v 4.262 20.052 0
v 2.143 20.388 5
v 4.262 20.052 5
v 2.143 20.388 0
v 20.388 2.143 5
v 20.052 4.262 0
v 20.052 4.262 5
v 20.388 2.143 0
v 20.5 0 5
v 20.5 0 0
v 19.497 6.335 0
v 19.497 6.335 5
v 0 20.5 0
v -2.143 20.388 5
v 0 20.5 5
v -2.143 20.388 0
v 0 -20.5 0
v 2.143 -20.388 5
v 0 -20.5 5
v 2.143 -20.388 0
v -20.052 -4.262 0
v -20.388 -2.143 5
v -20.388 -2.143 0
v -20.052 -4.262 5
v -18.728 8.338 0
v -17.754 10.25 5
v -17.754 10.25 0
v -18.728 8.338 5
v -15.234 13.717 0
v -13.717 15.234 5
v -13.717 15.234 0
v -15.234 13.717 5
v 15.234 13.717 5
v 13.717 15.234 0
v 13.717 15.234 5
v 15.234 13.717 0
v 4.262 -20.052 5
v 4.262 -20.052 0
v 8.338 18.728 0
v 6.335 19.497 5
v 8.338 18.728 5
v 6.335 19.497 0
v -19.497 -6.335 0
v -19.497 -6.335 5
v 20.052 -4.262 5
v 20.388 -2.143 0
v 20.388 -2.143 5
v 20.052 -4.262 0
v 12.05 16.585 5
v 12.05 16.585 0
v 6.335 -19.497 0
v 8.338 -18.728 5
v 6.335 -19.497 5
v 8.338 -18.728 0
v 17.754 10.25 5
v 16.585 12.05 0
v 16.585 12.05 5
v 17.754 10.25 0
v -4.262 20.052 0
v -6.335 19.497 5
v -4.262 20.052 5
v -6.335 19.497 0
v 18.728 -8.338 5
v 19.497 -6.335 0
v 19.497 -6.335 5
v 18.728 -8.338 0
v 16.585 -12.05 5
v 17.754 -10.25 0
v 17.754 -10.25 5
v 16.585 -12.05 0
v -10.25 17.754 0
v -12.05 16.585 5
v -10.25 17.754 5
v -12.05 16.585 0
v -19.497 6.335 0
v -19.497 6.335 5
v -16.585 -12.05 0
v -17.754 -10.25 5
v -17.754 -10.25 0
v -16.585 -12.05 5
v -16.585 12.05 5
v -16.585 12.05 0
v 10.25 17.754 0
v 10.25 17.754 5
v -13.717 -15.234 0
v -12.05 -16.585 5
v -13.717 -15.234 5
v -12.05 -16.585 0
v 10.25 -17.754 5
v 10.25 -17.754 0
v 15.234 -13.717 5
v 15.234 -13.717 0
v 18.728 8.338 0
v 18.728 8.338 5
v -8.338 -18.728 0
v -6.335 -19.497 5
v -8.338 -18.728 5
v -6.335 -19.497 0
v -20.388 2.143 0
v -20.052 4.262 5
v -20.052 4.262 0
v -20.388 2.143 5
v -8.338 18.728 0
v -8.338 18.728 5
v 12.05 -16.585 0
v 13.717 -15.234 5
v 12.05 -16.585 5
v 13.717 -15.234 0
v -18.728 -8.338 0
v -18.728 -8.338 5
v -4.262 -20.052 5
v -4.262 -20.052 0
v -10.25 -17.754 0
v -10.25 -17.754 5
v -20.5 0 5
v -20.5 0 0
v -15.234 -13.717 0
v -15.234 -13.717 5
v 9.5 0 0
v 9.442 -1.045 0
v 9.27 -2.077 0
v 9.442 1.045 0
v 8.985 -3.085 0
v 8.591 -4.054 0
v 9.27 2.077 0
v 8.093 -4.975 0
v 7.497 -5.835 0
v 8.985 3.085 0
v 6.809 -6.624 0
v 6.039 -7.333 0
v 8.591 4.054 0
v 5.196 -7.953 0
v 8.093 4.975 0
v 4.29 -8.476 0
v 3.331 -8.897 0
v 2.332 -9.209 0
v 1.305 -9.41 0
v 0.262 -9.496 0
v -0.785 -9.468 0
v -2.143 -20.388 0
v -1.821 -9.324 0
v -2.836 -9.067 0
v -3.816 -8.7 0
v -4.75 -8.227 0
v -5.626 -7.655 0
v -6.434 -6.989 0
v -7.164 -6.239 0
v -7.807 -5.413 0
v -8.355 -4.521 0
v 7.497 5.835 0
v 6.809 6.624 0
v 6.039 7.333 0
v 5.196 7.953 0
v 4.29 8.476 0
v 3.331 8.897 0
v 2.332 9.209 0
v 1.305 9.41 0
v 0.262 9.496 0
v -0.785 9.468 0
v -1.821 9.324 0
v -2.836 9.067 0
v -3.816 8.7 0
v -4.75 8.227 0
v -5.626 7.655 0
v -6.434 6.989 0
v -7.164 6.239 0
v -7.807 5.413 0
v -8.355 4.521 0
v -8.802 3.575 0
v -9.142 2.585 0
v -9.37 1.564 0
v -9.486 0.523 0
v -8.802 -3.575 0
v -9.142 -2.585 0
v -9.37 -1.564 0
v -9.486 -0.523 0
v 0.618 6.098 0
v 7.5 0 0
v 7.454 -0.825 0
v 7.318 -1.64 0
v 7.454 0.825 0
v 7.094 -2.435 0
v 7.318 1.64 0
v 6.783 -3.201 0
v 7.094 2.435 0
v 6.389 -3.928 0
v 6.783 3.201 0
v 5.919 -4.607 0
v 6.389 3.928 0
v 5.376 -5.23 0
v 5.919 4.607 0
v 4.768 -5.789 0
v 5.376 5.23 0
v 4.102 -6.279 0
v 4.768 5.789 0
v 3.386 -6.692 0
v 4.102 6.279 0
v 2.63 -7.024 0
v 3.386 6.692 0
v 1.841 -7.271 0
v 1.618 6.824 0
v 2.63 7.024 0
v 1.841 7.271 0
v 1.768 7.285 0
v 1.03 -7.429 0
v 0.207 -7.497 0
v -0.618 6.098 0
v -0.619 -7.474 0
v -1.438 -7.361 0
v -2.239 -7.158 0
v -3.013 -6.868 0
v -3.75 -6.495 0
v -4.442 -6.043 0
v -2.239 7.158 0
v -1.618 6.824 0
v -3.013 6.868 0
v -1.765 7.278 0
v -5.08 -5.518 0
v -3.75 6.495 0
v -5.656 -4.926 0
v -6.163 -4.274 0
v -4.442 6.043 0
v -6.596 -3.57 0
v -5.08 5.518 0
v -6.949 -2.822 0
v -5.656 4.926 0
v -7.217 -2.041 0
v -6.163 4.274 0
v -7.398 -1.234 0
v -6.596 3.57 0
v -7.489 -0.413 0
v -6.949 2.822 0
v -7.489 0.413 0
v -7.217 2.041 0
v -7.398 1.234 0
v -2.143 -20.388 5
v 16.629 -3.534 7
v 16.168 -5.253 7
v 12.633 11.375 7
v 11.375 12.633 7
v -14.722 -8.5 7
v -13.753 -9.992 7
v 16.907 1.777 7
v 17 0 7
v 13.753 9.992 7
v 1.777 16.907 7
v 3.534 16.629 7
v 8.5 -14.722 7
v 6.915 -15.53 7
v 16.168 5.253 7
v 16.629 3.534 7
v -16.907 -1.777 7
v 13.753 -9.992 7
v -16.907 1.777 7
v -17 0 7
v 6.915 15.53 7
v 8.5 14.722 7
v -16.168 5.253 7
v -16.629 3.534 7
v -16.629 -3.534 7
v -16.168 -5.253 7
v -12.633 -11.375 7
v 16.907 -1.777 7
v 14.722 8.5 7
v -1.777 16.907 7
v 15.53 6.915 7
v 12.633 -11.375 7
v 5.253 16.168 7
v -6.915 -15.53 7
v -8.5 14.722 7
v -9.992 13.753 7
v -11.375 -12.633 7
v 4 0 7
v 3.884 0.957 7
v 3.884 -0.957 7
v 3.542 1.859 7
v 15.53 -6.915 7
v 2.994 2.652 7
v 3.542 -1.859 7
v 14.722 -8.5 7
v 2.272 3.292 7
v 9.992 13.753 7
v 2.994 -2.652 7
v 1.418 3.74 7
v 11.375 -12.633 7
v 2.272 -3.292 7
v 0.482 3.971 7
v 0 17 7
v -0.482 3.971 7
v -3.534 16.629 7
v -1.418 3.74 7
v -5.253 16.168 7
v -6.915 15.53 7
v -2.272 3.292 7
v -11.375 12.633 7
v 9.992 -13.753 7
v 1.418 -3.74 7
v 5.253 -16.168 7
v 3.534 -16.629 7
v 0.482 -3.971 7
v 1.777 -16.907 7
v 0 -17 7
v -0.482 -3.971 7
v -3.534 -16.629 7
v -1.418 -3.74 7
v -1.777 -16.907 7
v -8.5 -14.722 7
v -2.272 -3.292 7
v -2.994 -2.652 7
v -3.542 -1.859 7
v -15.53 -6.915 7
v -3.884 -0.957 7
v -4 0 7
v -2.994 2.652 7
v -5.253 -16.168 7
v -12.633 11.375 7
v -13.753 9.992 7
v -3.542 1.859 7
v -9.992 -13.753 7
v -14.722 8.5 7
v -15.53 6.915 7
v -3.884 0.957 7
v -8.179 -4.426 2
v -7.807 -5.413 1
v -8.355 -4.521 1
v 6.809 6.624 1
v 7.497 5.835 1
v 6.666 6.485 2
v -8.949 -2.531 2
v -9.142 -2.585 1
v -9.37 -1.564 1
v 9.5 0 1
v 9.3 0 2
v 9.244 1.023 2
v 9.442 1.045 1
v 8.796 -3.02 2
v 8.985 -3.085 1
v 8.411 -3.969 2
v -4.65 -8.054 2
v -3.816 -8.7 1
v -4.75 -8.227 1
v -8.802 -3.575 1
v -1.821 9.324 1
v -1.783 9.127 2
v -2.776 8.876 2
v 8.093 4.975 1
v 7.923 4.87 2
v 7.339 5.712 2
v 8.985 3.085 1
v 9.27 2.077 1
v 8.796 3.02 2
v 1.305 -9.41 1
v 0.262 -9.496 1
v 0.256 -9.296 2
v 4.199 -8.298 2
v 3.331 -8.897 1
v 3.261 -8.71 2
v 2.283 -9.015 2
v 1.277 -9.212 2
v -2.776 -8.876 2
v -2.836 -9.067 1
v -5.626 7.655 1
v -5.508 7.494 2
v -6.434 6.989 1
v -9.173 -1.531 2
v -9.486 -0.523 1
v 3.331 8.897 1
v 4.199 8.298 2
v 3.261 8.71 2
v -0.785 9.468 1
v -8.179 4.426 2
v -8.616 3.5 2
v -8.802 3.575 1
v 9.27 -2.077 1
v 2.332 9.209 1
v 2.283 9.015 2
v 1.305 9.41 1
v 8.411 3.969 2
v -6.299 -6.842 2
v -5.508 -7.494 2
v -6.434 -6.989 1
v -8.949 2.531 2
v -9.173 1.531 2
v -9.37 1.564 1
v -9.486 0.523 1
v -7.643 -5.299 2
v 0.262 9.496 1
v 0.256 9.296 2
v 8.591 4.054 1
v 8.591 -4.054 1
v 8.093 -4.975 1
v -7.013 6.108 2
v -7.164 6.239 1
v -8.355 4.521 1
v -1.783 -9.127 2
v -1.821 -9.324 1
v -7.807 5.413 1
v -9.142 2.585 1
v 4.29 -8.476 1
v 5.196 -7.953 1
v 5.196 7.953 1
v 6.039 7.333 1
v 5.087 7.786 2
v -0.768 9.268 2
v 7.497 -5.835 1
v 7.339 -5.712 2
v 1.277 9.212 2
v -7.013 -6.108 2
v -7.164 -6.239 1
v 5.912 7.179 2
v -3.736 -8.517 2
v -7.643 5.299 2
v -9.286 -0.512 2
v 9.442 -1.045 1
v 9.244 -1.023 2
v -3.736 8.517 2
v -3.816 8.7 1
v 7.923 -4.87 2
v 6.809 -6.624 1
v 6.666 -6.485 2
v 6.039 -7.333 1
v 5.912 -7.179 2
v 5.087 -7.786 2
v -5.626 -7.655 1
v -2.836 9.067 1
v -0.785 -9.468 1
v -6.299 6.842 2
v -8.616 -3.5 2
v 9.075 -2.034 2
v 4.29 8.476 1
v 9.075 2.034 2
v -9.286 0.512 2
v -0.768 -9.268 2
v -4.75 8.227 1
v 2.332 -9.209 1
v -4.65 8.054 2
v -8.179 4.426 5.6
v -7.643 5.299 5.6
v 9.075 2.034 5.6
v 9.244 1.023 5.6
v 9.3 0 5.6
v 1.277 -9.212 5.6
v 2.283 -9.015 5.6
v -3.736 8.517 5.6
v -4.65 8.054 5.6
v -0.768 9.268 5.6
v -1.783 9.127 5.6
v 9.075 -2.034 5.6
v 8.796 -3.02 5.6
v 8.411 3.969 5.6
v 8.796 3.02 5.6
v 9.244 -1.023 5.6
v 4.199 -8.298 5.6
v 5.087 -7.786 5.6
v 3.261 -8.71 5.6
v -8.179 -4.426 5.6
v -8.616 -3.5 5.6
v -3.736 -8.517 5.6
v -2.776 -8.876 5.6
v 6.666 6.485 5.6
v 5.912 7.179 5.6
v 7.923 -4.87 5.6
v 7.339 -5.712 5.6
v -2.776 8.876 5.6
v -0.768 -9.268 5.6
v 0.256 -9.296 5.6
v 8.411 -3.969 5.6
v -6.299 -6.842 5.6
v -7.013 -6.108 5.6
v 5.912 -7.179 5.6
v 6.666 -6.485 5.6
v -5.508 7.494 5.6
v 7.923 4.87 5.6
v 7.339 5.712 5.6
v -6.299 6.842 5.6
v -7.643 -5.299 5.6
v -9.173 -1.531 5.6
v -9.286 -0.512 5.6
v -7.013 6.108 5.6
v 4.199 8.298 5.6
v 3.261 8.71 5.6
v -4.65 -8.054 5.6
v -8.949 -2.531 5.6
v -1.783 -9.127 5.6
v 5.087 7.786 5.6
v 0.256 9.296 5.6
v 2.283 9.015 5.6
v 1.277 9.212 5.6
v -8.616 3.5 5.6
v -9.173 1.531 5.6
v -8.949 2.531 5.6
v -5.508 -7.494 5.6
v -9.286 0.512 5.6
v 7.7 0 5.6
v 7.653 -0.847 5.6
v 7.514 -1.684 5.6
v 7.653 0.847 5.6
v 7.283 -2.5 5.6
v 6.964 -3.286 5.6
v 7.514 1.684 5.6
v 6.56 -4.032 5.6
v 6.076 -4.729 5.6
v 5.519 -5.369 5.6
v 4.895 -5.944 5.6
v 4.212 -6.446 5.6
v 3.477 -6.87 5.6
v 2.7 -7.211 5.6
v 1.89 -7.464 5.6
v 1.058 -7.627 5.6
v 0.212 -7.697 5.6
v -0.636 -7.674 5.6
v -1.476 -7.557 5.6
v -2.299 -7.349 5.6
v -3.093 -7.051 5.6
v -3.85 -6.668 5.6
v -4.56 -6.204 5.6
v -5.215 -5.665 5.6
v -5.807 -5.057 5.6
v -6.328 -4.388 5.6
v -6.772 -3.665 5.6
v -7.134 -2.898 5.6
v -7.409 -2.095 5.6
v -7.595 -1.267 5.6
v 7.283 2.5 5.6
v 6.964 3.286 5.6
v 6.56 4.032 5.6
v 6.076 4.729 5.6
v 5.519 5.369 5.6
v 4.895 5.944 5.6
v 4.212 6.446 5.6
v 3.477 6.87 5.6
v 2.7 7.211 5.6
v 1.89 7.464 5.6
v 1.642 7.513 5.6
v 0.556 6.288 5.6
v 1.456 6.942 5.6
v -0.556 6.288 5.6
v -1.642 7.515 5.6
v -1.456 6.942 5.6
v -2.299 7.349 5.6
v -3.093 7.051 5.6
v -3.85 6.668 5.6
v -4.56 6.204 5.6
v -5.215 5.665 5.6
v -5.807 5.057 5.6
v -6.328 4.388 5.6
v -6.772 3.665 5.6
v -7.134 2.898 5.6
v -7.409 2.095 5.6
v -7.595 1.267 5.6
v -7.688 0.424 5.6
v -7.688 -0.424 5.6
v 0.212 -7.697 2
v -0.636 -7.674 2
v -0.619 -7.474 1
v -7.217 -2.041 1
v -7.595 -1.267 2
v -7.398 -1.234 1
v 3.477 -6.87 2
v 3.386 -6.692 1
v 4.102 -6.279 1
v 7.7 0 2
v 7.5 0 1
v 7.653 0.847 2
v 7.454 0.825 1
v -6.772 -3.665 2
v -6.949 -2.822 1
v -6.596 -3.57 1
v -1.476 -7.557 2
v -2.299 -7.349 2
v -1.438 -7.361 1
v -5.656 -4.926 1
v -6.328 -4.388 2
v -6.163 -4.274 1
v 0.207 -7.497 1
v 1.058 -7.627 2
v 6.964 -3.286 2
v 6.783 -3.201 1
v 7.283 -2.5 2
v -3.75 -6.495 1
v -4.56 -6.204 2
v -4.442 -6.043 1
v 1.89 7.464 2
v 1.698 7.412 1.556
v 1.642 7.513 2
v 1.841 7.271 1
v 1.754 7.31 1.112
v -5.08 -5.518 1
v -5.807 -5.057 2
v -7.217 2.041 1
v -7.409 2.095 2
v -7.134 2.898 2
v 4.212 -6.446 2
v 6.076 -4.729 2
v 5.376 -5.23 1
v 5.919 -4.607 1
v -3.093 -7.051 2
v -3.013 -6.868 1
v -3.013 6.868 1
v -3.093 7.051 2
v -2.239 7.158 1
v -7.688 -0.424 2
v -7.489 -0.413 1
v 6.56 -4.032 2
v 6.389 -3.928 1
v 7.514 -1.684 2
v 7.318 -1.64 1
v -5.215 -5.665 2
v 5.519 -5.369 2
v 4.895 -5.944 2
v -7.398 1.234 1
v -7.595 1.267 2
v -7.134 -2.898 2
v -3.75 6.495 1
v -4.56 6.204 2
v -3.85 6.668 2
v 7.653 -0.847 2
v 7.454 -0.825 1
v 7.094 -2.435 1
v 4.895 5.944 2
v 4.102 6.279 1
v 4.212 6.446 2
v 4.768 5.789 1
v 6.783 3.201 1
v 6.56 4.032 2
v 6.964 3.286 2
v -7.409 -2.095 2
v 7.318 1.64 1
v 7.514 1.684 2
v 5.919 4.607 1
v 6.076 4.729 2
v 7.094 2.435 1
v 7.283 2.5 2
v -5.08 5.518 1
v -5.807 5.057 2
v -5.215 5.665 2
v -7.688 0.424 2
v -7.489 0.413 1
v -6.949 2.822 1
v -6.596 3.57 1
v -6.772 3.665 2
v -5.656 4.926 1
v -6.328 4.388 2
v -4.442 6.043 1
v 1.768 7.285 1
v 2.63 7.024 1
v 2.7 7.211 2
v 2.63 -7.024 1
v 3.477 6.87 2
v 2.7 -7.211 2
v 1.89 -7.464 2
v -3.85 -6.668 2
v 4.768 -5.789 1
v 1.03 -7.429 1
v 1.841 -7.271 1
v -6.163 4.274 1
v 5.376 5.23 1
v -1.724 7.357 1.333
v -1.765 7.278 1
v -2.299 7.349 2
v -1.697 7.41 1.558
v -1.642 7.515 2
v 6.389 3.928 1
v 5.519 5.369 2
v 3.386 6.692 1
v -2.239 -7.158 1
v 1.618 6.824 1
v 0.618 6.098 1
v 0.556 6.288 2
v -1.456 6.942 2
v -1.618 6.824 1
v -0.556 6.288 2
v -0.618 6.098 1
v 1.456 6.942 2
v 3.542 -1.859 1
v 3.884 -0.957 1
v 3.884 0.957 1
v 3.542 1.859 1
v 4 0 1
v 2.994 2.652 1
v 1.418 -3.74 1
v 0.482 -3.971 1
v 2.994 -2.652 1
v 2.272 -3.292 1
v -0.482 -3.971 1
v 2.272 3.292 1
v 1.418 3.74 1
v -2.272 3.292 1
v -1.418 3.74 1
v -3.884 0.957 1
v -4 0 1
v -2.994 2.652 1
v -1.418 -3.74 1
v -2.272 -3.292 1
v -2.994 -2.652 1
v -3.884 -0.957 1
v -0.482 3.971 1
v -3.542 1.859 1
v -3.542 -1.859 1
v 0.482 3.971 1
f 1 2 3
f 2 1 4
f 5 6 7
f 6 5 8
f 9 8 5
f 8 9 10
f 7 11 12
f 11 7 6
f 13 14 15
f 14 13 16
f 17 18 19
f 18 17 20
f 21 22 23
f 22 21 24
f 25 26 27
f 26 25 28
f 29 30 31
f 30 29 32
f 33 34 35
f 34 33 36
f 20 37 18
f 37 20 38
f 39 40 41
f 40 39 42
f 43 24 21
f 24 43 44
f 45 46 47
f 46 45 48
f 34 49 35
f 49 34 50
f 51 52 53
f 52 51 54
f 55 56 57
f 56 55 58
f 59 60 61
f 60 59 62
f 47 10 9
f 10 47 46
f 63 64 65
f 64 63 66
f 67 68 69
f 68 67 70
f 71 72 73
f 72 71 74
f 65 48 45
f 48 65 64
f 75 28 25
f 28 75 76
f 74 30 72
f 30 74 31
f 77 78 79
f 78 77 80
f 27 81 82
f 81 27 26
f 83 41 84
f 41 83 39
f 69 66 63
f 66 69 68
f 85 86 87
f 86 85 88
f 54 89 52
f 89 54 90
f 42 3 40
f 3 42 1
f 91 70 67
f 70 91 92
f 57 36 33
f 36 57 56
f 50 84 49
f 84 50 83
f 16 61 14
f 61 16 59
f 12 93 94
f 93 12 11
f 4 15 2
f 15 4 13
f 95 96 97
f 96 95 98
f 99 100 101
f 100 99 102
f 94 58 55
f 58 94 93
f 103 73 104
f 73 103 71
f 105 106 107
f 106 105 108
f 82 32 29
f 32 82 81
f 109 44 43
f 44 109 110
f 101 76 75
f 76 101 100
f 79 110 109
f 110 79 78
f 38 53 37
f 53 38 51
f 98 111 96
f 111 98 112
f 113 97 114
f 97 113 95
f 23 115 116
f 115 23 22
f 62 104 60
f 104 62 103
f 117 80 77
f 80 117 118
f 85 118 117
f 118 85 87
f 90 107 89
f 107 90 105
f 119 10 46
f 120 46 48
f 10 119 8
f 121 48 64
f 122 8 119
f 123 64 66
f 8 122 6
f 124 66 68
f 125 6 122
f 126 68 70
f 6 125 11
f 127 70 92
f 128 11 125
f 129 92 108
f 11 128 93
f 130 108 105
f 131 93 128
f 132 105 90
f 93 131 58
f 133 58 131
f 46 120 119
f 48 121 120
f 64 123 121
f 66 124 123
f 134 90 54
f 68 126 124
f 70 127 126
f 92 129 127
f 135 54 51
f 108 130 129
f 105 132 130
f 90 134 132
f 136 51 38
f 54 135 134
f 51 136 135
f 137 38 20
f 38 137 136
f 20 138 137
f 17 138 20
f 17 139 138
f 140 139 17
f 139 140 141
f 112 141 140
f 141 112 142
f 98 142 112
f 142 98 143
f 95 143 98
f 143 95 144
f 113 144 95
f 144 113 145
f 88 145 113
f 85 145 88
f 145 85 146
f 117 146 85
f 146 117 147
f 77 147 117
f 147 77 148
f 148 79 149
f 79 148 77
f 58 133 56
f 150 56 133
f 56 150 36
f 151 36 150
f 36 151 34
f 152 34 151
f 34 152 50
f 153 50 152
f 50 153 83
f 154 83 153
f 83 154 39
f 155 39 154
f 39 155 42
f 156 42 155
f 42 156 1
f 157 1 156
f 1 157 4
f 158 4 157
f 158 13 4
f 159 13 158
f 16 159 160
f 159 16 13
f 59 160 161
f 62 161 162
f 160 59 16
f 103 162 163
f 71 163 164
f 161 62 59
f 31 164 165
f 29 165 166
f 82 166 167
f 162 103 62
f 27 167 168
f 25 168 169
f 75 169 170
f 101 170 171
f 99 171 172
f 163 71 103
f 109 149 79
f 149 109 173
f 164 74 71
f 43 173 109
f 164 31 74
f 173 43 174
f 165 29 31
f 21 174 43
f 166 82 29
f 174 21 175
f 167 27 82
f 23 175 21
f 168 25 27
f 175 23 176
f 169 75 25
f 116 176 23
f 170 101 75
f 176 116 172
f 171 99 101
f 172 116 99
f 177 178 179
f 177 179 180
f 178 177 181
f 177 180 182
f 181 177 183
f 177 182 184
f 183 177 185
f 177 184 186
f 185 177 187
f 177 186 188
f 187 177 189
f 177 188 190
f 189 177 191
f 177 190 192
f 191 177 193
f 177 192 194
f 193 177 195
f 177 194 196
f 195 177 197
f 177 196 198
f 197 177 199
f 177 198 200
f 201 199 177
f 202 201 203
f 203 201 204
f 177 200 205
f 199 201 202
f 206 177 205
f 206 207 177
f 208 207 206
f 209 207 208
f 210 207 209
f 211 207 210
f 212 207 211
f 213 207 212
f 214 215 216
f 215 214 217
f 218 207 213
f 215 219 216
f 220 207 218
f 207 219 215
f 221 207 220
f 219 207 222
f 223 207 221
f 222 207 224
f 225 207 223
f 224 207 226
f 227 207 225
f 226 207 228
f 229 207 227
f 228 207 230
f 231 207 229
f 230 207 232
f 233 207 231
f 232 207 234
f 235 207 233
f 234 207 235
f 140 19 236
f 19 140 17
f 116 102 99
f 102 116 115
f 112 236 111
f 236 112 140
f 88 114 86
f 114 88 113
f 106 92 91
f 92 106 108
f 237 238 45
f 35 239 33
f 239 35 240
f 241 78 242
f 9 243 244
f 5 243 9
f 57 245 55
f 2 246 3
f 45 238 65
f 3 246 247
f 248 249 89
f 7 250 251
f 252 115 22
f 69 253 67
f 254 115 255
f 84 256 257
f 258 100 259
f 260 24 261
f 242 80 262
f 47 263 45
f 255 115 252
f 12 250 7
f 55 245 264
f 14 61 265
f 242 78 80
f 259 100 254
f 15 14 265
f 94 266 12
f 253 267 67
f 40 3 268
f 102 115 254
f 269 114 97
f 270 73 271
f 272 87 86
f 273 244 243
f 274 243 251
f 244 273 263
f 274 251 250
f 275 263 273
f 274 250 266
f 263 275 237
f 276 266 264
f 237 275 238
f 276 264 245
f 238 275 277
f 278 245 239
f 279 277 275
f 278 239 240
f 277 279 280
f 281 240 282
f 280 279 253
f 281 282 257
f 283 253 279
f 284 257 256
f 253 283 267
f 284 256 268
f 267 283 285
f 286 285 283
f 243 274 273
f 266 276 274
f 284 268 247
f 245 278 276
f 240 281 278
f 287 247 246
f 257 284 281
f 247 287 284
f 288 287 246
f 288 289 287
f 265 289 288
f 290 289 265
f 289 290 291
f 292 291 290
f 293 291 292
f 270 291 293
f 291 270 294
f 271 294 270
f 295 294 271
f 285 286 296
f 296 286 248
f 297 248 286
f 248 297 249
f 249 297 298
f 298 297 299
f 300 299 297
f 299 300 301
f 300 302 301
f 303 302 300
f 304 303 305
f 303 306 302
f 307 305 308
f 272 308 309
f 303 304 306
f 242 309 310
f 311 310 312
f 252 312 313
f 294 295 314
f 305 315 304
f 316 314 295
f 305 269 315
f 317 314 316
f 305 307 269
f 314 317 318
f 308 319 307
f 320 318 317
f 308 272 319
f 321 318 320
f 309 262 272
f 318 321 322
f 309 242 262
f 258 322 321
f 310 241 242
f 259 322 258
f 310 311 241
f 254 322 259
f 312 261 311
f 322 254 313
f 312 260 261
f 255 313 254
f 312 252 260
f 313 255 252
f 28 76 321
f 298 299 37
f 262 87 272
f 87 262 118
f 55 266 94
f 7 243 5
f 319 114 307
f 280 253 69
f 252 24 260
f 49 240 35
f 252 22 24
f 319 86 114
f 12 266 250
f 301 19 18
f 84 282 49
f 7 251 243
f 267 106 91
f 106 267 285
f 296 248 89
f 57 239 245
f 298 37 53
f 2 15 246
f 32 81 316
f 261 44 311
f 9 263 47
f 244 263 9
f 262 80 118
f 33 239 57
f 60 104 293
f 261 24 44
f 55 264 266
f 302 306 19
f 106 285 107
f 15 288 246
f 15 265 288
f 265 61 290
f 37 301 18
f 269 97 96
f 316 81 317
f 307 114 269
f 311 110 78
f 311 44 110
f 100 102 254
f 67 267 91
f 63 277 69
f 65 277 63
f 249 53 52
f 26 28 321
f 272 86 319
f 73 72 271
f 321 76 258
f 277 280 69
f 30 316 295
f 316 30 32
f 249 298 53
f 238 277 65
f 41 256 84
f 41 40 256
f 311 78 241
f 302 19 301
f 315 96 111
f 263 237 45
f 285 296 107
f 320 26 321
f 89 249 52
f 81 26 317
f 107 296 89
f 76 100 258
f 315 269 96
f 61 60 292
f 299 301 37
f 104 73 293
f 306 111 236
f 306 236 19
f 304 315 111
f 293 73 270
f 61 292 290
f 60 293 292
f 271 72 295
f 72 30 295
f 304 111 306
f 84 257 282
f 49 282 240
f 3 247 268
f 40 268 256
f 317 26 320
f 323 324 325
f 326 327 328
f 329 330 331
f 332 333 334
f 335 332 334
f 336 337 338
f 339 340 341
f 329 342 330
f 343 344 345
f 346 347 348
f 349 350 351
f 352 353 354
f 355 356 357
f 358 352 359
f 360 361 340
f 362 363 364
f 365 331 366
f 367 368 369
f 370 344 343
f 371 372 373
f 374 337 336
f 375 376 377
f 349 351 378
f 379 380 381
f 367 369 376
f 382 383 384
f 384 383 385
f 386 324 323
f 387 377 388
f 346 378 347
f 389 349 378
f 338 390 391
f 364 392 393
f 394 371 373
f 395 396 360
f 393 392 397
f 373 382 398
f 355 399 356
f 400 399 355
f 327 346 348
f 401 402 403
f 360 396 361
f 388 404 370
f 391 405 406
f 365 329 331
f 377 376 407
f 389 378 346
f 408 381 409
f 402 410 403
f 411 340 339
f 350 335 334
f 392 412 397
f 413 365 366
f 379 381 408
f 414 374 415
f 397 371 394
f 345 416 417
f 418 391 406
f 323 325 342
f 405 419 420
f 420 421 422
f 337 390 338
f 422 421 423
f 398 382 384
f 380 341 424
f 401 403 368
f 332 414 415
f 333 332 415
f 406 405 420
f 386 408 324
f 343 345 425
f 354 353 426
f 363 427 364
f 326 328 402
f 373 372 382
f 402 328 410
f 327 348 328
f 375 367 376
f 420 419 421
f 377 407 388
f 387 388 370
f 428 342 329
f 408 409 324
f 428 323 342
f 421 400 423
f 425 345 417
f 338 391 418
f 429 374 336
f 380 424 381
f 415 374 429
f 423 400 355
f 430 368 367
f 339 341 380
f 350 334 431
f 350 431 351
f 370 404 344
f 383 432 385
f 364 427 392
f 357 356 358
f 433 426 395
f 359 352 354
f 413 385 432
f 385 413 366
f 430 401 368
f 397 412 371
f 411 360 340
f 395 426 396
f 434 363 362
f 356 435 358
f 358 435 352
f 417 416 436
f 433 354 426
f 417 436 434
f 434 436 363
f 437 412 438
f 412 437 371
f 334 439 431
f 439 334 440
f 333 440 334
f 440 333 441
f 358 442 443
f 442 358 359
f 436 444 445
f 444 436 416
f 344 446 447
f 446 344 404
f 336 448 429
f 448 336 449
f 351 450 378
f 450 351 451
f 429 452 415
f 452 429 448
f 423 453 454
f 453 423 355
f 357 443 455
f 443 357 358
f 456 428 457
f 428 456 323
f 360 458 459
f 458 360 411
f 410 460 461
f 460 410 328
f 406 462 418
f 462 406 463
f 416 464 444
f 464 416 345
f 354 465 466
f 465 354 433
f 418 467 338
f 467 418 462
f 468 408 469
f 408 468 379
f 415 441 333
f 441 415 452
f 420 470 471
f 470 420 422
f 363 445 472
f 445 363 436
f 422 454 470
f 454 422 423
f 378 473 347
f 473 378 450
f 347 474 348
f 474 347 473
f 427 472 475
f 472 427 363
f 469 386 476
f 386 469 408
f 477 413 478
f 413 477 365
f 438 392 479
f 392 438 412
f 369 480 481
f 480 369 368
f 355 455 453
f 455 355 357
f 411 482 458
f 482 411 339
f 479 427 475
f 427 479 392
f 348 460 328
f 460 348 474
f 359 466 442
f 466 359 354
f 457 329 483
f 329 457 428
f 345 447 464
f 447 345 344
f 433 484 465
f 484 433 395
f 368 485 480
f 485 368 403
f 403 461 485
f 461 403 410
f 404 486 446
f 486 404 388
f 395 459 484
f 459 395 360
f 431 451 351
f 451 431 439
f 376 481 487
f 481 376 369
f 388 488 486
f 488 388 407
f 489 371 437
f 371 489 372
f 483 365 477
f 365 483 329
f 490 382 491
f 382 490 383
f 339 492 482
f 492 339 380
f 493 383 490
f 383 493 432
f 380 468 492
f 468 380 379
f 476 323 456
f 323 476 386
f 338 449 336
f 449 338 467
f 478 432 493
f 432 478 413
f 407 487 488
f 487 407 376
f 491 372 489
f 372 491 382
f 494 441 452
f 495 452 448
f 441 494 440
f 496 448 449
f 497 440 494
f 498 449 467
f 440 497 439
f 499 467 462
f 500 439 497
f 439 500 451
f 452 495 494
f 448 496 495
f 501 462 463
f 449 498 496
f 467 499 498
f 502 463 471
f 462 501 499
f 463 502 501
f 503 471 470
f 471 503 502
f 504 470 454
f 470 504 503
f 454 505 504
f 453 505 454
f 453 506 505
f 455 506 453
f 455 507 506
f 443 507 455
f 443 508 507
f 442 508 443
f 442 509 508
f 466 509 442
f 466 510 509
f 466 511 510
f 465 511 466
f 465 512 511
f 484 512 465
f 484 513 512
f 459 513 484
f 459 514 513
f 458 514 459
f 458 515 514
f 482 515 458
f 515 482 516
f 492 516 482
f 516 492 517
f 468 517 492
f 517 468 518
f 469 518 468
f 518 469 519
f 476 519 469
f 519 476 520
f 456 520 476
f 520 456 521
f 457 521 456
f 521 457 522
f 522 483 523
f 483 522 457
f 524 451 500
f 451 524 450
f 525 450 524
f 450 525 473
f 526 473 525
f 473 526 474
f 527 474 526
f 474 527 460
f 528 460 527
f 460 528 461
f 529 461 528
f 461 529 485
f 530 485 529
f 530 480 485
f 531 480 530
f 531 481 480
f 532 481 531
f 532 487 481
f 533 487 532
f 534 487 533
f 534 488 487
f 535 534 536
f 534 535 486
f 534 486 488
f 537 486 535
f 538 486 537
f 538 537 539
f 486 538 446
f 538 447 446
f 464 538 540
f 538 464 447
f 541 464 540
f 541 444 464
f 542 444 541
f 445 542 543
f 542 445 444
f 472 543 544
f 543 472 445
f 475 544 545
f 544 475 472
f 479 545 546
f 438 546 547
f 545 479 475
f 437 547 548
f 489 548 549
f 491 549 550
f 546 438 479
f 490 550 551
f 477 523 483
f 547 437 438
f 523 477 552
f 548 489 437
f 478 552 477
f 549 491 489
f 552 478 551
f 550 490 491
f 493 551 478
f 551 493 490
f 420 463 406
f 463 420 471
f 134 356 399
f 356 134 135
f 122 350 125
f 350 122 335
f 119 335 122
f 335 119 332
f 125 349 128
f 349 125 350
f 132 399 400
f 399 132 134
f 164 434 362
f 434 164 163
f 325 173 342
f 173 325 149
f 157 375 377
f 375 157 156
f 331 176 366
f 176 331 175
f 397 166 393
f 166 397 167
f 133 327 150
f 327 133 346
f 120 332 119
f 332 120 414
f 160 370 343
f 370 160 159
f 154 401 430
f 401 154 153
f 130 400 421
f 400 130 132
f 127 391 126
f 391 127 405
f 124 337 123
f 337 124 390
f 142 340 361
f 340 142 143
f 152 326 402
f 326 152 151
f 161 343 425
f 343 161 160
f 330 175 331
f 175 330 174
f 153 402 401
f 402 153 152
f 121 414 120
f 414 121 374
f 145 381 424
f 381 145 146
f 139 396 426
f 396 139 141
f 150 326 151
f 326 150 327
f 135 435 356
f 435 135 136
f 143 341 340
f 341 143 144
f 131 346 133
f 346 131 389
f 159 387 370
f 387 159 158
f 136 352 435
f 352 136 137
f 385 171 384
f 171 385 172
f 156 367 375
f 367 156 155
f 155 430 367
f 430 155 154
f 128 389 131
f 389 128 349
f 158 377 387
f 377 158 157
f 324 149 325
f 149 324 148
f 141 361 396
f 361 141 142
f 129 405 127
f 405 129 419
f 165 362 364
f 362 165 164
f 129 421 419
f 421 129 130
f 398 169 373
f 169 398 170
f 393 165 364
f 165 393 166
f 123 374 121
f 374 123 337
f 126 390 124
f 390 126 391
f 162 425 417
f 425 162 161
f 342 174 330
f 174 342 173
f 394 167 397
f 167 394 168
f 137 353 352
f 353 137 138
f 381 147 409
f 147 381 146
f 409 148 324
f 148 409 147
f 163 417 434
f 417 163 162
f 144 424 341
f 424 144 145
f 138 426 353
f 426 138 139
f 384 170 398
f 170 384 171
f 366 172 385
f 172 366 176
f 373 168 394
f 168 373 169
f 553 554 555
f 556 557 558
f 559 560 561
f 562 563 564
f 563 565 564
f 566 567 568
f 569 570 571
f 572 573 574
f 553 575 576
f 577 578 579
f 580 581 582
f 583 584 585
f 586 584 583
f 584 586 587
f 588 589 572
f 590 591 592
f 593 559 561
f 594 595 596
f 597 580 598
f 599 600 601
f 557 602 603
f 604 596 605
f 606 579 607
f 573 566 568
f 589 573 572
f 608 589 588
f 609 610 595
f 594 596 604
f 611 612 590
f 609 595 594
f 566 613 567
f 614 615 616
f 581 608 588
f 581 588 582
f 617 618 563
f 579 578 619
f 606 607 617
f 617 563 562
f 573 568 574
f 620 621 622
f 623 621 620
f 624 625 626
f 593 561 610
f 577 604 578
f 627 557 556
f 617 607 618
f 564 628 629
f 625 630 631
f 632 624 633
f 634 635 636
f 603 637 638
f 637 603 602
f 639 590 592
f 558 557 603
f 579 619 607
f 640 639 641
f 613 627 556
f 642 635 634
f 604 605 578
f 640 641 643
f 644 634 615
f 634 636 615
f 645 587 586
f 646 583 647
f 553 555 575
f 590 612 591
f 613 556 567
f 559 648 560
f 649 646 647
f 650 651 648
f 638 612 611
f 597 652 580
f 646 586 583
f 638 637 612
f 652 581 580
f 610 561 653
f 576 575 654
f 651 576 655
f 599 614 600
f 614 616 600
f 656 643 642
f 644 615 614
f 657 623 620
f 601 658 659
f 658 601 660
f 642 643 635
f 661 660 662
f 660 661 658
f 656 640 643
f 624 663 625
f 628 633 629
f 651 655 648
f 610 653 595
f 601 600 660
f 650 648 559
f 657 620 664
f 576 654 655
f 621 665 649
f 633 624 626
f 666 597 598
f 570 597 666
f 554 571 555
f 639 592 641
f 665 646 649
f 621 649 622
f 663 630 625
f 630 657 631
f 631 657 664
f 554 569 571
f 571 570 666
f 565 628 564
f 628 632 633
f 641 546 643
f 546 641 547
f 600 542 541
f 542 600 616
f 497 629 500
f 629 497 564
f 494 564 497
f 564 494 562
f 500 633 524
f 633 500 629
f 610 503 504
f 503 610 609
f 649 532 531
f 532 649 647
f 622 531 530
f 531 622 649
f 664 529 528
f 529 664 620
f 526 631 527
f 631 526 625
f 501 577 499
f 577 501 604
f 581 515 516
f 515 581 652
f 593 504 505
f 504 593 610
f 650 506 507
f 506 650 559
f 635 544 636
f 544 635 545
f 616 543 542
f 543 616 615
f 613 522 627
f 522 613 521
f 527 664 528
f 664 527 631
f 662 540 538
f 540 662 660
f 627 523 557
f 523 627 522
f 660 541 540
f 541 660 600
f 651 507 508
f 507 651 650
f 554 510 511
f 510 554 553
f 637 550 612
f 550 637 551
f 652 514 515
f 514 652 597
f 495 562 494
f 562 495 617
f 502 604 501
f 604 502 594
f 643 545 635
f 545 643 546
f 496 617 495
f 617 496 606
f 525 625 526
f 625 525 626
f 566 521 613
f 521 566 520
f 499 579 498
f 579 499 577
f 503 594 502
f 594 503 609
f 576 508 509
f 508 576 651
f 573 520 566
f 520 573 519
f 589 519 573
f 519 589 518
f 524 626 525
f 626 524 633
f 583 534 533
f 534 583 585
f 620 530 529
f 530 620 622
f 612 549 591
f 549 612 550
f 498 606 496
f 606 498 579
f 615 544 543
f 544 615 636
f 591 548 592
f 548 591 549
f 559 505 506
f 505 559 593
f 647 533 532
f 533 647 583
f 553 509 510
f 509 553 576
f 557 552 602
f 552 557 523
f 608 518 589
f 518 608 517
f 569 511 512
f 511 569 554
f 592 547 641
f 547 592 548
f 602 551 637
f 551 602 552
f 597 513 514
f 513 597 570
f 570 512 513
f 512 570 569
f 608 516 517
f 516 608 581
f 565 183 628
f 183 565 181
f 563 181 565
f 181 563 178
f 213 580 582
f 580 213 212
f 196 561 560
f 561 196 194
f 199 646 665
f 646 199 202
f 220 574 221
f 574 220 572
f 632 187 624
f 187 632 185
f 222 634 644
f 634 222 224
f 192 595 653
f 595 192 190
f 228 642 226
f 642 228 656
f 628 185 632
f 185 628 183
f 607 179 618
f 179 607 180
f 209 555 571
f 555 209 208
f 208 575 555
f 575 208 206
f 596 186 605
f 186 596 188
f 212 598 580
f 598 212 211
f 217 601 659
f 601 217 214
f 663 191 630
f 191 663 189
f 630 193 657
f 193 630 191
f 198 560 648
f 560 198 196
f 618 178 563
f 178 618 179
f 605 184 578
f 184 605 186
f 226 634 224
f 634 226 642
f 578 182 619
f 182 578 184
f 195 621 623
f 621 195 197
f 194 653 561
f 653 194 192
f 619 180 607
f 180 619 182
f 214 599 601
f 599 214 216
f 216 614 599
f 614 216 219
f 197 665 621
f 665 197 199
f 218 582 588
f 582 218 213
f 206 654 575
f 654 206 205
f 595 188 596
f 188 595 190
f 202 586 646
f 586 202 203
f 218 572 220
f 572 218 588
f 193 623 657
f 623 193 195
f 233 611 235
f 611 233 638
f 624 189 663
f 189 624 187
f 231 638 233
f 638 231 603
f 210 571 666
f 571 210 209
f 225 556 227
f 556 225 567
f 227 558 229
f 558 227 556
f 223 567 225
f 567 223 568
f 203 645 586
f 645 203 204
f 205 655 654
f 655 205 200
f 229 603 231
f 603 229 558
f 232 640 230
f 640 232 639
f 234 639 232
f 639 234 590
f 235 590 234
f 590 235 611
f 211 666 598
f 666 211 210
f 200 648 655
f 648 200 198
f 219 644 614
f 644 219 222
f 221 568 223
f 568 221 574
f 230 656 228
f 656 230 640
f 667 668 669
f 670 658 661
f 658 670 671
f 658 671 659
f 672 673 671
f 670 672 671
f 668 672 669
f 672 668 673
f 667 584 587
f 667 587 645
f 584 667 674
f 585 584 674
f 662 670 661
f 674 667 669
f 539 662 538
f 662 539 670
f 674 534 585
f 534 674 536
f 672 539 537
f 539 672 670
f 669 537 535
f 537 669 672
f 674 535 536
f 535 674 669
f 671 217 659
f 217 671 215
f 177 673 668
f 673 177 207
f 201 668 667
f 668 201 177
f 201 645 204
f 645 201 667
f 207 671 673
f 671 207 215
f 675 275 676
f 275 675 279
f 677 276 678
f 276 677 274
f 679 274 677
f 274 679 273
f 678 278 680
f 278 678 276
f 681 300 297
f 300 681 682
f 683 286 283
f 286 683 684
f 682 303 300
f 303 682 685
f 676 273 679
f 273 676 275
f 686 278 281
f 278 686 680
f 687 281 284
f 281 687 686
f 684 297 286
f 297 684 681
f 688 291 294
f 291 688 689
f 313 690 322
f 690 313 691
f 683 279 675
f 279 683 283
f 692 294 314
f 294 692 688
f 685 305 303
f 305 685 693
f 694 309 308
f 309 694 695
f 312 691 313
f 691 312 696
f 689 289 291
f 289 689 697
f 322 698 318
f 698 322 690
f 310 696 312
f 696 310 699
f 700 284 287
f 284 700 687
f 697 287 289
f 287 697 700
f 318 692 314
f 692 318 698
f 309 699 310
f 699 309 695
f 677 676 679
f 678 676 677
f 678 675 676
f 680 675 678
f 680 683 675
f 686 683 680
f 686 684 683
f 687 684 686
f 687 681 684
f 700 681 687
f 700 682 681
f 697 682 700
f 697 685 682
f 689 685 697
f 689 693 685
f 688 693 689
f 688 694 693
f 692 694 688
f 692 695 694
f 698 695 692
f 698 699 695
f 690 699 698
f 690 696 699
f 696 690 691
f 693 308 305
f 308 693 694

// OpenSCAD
// file: ../../connectors/notched_circle/constants.scad
connectors_notched_circle_thickness = 2;
connectors_notched_circle_notch_diameter = 3;
connectors_notched_circle_loose_length = 1;
connectors_notched_circle_loose_to_tight_length = 1;
// file: ../../connectors/notched_circle/female.scad
include <../../settings.scad>;
use <../../utilities/cylinders.scad>;
include <constants.scad>;

// Renders the female counterpart of a circular connector with an orienting
// notch.  Place on the surface oriented so that Z- is the surface normal.
module connectors_notched_circle_female(
    // The outer diameter of the compatible male circle.
    diameter,
    // The length of the male compatible circle.
    length
) {
  outer_circle_diameter_loose = diameter + loose_tolerance;
  outer_circle_diameter_tight = diameter + tight_tolerance;
  inner_circle_diameter_loose = diameter - connectors_notched_circle_thickness - loose_tolerance;
  inner_circle_diameter_tight = diameter - connectors_notched_circle_thickness - tight_tolerance;
  notch_diameter_loose = connectors_notched_circle_notch_diameter + loose_tolerance;
  notch_diameter_tight = connectors_notched_circle_notch_diameter + tight_tolerance;
  final_circle_length = length + tight_tolerance - connectors_notched_circle_loose_length - connectors_notched_circle_loose_to_tight_length;
  union() {
    difference() {
      // The outer circle.
      cylinder_sequence(
        outer_circle_diameter_loose,
        [
          [
            connectors_notched_circle_loose_length,
            outer_circle_diameter_loose
          ],
          [
            connectors_notched_circle_loose_to_tight_length,
            outer_circle_diameter_tight
          ],
          [
            final_circle_length,
            outer_circle_diameter_tight
          ],
        ],
        cylinder_sides(diameter)
      );

      // The inner circle.
      cylinder_sequence(
        inner_circle_diameter_loose,
        [
          [
            connectors_notched_circle_loose_length,
            inner_circle_diameter_loose
          ],
          [
            connectors_notched_circle_loose_to_tight_length,
            inner_circle_diameter_tight
          ],
          [
            final_circle_length,
            inner_circle_diameter_tight
          ],
        ],
        cylinder_sides(diameter)
      );
    };

    intersection() {
      // The notch.
      translate([
        0,
        diameter / 2 - connectors_notched_circle_thickness / 2,
        0
      ]) {
        cylinder_sequence(
          notch_diameter_loose,
          [
            [
              connectors_notched_circle_loose_length,
              notch_diameter_loose
            ],
            [
              connectors_notched_circle_loose_to_tight_length,
              notch_diameter_tight
            ],
            [
              final_circle_length,
              notch_diameter_tight
            ],
          ],
          cylinder_sides(connectors_notched_circle_notch_diameter)
        );
      };

      // Ensure that the notch does not escape the outer circle.
      cylinder_sequence(
        outer_circle_diameter_loose,
        [
          [
            connectors_notched_circle_loose_length,
            outer_circle_diameter_loose
          ],
          [
            connectors_notched_circle_loose_to_tight_length,
            outer_circle_diameter_tight
          ],
          [
            final_circle_length,
            outer_circle_diameter_tight
          ],
        ],
        cylinder_sides(diameter)
      );
    };
  };
};
// file: measurements.scad
hero_dualie_muzzle_hole_diameter = 8;
hero_dualie_muzzle_hole_depth = 6;
hero_dualie_muzzle_end_diameter = 34;
hero_dualie_muzzle_start_diameter = 41;
hero_dualie_muzzle_length = 2;
hero_dualie_muzzle_connector_diameter = 18;
hero_dualie_muzzle_connector_length = 5;
// file: ../../utilities/cylinders.scad
// Calculates the $fn which should be used for a cylinder of a specific size.
function cylinder_sides(
  // The diameter of the cylinder.
  diameter
) = ceil(
  max(
    min(
      360 / $fa,
      diameter * PI / $fs
    ),
    8
  )
);

// Generates a grid of square perforations through a cylinder of a specific
// size.
module cylinder_perforations(
  // The diameter of the cylinder.
  diameter,
  // The height of the cylinder.
  length,
  // The size (width/height) of each perforation.
  perforation_size,
  // The target spacing between perforations.  This will be adjusted to fit
  // evenly on the cylinder.
  perforation_spacing
) {
  half_perimeter = diameter * PI / 2;
  angularPerforations = round(half_perimeter / perforation_spacing);
  zPerforations = round(half_perimeter / perforation_spacing);
  for (angle = [0:180 / angularPerforations:180]) {
    rotate([0, 0, angle]) {
      for (z = [perforation_spacing:perforation_spacing:length - perforation_spacing]) {
        translate([0, 0, z]) {
          cube([diameter, perforation_size, perforation_size], center = true);
        };
      }
    };
  };
};

// Generates a "pipe" which lofts a sequence of circles together.
module cylinder_sequence(
  // The diameter of the first circle.
  initial_diameter,
  // An array of arrays, where each child array is two numbers:
  // - The length of the segment along Z.
  // - The diameter of the end of the segment.
  length_diameter_pairs,
  // The number of sides of all circles drawn.
  sides,
  // Used for recursion; leave as default.
  i = 0
) {
  if (i < len(length_diameter_pairs)) {
    cylinder(
      d1 = initial_diameter,
      d2 = length_diameter_pairs[i][1],
      h = length_diameter_pairs[i][0],
      $fn = sides
    );
    translate([
      0,
      0,
      length_diameter_pairs[i][0]
    ]) {
      cylinder_sequence(
        length_diameter_pairs[i][1],
        length_diameter_pairs,
        sides,
        i + 1
      );
    };
  };
};
// file: shape.scad
use <../../utilities/cylinders.scad>;
include <measurements.scad>;
use <../../connectors/notched_circle/female.scad>;

module hero_dualie_muzzle_shape() {
  difference() {
    // The body.
    cylinder_sequence(
      hero_dualie_muzzle_start_diameter,
      [
        [
          hero_dualie_muzzle_connector_length,
          hero_dualie_muzzle_start_diameter
        ],
        [
          hero_dualie_muzzle_length,
          hero_dualie_muzzle_end_diameter
        ]
      ],
      cylinder_sides(hero_dualie_muzzle_start_diameter)
    );

    // The hole in the end.
    translate([
      0,
      0,
      hero_dualie_muzzle_connector_length + hero_dualie_muzzle_length - hero_dualie_muzzle_hole_depth
    ]) {
      cylinder(
        d = hero_dualie_muzzle_hole_diameter,
        h = hero_dualie_muzzle_hole_depth,
        $fn = cylinder_sides(hero_dualie_muzzle_hole_diameter)
      );
    };

    // The connector to the muffler.
    connectors_notched_circle_female(
      hero_dualie_muzzle_connector_diameter,
      hero_dualie_muzzle_connector_length
    );
  };
};
// file: ../../settings.scad
// When true, lower resolution primitives will be used.
draft = false;

$fs = draft ? 2 : 1;
$fa = draft ? 12 : 6;

// The amount of space left between parts which must fit together tightly.
tight_tolerance = 0.6;

// The amount of space left between parts which must fit together loosely.
loose_tolerance = 1;
// main file
include <../../settings.scad>;
use <shape.scad>;

hero_dualie_muzzle_shape();
